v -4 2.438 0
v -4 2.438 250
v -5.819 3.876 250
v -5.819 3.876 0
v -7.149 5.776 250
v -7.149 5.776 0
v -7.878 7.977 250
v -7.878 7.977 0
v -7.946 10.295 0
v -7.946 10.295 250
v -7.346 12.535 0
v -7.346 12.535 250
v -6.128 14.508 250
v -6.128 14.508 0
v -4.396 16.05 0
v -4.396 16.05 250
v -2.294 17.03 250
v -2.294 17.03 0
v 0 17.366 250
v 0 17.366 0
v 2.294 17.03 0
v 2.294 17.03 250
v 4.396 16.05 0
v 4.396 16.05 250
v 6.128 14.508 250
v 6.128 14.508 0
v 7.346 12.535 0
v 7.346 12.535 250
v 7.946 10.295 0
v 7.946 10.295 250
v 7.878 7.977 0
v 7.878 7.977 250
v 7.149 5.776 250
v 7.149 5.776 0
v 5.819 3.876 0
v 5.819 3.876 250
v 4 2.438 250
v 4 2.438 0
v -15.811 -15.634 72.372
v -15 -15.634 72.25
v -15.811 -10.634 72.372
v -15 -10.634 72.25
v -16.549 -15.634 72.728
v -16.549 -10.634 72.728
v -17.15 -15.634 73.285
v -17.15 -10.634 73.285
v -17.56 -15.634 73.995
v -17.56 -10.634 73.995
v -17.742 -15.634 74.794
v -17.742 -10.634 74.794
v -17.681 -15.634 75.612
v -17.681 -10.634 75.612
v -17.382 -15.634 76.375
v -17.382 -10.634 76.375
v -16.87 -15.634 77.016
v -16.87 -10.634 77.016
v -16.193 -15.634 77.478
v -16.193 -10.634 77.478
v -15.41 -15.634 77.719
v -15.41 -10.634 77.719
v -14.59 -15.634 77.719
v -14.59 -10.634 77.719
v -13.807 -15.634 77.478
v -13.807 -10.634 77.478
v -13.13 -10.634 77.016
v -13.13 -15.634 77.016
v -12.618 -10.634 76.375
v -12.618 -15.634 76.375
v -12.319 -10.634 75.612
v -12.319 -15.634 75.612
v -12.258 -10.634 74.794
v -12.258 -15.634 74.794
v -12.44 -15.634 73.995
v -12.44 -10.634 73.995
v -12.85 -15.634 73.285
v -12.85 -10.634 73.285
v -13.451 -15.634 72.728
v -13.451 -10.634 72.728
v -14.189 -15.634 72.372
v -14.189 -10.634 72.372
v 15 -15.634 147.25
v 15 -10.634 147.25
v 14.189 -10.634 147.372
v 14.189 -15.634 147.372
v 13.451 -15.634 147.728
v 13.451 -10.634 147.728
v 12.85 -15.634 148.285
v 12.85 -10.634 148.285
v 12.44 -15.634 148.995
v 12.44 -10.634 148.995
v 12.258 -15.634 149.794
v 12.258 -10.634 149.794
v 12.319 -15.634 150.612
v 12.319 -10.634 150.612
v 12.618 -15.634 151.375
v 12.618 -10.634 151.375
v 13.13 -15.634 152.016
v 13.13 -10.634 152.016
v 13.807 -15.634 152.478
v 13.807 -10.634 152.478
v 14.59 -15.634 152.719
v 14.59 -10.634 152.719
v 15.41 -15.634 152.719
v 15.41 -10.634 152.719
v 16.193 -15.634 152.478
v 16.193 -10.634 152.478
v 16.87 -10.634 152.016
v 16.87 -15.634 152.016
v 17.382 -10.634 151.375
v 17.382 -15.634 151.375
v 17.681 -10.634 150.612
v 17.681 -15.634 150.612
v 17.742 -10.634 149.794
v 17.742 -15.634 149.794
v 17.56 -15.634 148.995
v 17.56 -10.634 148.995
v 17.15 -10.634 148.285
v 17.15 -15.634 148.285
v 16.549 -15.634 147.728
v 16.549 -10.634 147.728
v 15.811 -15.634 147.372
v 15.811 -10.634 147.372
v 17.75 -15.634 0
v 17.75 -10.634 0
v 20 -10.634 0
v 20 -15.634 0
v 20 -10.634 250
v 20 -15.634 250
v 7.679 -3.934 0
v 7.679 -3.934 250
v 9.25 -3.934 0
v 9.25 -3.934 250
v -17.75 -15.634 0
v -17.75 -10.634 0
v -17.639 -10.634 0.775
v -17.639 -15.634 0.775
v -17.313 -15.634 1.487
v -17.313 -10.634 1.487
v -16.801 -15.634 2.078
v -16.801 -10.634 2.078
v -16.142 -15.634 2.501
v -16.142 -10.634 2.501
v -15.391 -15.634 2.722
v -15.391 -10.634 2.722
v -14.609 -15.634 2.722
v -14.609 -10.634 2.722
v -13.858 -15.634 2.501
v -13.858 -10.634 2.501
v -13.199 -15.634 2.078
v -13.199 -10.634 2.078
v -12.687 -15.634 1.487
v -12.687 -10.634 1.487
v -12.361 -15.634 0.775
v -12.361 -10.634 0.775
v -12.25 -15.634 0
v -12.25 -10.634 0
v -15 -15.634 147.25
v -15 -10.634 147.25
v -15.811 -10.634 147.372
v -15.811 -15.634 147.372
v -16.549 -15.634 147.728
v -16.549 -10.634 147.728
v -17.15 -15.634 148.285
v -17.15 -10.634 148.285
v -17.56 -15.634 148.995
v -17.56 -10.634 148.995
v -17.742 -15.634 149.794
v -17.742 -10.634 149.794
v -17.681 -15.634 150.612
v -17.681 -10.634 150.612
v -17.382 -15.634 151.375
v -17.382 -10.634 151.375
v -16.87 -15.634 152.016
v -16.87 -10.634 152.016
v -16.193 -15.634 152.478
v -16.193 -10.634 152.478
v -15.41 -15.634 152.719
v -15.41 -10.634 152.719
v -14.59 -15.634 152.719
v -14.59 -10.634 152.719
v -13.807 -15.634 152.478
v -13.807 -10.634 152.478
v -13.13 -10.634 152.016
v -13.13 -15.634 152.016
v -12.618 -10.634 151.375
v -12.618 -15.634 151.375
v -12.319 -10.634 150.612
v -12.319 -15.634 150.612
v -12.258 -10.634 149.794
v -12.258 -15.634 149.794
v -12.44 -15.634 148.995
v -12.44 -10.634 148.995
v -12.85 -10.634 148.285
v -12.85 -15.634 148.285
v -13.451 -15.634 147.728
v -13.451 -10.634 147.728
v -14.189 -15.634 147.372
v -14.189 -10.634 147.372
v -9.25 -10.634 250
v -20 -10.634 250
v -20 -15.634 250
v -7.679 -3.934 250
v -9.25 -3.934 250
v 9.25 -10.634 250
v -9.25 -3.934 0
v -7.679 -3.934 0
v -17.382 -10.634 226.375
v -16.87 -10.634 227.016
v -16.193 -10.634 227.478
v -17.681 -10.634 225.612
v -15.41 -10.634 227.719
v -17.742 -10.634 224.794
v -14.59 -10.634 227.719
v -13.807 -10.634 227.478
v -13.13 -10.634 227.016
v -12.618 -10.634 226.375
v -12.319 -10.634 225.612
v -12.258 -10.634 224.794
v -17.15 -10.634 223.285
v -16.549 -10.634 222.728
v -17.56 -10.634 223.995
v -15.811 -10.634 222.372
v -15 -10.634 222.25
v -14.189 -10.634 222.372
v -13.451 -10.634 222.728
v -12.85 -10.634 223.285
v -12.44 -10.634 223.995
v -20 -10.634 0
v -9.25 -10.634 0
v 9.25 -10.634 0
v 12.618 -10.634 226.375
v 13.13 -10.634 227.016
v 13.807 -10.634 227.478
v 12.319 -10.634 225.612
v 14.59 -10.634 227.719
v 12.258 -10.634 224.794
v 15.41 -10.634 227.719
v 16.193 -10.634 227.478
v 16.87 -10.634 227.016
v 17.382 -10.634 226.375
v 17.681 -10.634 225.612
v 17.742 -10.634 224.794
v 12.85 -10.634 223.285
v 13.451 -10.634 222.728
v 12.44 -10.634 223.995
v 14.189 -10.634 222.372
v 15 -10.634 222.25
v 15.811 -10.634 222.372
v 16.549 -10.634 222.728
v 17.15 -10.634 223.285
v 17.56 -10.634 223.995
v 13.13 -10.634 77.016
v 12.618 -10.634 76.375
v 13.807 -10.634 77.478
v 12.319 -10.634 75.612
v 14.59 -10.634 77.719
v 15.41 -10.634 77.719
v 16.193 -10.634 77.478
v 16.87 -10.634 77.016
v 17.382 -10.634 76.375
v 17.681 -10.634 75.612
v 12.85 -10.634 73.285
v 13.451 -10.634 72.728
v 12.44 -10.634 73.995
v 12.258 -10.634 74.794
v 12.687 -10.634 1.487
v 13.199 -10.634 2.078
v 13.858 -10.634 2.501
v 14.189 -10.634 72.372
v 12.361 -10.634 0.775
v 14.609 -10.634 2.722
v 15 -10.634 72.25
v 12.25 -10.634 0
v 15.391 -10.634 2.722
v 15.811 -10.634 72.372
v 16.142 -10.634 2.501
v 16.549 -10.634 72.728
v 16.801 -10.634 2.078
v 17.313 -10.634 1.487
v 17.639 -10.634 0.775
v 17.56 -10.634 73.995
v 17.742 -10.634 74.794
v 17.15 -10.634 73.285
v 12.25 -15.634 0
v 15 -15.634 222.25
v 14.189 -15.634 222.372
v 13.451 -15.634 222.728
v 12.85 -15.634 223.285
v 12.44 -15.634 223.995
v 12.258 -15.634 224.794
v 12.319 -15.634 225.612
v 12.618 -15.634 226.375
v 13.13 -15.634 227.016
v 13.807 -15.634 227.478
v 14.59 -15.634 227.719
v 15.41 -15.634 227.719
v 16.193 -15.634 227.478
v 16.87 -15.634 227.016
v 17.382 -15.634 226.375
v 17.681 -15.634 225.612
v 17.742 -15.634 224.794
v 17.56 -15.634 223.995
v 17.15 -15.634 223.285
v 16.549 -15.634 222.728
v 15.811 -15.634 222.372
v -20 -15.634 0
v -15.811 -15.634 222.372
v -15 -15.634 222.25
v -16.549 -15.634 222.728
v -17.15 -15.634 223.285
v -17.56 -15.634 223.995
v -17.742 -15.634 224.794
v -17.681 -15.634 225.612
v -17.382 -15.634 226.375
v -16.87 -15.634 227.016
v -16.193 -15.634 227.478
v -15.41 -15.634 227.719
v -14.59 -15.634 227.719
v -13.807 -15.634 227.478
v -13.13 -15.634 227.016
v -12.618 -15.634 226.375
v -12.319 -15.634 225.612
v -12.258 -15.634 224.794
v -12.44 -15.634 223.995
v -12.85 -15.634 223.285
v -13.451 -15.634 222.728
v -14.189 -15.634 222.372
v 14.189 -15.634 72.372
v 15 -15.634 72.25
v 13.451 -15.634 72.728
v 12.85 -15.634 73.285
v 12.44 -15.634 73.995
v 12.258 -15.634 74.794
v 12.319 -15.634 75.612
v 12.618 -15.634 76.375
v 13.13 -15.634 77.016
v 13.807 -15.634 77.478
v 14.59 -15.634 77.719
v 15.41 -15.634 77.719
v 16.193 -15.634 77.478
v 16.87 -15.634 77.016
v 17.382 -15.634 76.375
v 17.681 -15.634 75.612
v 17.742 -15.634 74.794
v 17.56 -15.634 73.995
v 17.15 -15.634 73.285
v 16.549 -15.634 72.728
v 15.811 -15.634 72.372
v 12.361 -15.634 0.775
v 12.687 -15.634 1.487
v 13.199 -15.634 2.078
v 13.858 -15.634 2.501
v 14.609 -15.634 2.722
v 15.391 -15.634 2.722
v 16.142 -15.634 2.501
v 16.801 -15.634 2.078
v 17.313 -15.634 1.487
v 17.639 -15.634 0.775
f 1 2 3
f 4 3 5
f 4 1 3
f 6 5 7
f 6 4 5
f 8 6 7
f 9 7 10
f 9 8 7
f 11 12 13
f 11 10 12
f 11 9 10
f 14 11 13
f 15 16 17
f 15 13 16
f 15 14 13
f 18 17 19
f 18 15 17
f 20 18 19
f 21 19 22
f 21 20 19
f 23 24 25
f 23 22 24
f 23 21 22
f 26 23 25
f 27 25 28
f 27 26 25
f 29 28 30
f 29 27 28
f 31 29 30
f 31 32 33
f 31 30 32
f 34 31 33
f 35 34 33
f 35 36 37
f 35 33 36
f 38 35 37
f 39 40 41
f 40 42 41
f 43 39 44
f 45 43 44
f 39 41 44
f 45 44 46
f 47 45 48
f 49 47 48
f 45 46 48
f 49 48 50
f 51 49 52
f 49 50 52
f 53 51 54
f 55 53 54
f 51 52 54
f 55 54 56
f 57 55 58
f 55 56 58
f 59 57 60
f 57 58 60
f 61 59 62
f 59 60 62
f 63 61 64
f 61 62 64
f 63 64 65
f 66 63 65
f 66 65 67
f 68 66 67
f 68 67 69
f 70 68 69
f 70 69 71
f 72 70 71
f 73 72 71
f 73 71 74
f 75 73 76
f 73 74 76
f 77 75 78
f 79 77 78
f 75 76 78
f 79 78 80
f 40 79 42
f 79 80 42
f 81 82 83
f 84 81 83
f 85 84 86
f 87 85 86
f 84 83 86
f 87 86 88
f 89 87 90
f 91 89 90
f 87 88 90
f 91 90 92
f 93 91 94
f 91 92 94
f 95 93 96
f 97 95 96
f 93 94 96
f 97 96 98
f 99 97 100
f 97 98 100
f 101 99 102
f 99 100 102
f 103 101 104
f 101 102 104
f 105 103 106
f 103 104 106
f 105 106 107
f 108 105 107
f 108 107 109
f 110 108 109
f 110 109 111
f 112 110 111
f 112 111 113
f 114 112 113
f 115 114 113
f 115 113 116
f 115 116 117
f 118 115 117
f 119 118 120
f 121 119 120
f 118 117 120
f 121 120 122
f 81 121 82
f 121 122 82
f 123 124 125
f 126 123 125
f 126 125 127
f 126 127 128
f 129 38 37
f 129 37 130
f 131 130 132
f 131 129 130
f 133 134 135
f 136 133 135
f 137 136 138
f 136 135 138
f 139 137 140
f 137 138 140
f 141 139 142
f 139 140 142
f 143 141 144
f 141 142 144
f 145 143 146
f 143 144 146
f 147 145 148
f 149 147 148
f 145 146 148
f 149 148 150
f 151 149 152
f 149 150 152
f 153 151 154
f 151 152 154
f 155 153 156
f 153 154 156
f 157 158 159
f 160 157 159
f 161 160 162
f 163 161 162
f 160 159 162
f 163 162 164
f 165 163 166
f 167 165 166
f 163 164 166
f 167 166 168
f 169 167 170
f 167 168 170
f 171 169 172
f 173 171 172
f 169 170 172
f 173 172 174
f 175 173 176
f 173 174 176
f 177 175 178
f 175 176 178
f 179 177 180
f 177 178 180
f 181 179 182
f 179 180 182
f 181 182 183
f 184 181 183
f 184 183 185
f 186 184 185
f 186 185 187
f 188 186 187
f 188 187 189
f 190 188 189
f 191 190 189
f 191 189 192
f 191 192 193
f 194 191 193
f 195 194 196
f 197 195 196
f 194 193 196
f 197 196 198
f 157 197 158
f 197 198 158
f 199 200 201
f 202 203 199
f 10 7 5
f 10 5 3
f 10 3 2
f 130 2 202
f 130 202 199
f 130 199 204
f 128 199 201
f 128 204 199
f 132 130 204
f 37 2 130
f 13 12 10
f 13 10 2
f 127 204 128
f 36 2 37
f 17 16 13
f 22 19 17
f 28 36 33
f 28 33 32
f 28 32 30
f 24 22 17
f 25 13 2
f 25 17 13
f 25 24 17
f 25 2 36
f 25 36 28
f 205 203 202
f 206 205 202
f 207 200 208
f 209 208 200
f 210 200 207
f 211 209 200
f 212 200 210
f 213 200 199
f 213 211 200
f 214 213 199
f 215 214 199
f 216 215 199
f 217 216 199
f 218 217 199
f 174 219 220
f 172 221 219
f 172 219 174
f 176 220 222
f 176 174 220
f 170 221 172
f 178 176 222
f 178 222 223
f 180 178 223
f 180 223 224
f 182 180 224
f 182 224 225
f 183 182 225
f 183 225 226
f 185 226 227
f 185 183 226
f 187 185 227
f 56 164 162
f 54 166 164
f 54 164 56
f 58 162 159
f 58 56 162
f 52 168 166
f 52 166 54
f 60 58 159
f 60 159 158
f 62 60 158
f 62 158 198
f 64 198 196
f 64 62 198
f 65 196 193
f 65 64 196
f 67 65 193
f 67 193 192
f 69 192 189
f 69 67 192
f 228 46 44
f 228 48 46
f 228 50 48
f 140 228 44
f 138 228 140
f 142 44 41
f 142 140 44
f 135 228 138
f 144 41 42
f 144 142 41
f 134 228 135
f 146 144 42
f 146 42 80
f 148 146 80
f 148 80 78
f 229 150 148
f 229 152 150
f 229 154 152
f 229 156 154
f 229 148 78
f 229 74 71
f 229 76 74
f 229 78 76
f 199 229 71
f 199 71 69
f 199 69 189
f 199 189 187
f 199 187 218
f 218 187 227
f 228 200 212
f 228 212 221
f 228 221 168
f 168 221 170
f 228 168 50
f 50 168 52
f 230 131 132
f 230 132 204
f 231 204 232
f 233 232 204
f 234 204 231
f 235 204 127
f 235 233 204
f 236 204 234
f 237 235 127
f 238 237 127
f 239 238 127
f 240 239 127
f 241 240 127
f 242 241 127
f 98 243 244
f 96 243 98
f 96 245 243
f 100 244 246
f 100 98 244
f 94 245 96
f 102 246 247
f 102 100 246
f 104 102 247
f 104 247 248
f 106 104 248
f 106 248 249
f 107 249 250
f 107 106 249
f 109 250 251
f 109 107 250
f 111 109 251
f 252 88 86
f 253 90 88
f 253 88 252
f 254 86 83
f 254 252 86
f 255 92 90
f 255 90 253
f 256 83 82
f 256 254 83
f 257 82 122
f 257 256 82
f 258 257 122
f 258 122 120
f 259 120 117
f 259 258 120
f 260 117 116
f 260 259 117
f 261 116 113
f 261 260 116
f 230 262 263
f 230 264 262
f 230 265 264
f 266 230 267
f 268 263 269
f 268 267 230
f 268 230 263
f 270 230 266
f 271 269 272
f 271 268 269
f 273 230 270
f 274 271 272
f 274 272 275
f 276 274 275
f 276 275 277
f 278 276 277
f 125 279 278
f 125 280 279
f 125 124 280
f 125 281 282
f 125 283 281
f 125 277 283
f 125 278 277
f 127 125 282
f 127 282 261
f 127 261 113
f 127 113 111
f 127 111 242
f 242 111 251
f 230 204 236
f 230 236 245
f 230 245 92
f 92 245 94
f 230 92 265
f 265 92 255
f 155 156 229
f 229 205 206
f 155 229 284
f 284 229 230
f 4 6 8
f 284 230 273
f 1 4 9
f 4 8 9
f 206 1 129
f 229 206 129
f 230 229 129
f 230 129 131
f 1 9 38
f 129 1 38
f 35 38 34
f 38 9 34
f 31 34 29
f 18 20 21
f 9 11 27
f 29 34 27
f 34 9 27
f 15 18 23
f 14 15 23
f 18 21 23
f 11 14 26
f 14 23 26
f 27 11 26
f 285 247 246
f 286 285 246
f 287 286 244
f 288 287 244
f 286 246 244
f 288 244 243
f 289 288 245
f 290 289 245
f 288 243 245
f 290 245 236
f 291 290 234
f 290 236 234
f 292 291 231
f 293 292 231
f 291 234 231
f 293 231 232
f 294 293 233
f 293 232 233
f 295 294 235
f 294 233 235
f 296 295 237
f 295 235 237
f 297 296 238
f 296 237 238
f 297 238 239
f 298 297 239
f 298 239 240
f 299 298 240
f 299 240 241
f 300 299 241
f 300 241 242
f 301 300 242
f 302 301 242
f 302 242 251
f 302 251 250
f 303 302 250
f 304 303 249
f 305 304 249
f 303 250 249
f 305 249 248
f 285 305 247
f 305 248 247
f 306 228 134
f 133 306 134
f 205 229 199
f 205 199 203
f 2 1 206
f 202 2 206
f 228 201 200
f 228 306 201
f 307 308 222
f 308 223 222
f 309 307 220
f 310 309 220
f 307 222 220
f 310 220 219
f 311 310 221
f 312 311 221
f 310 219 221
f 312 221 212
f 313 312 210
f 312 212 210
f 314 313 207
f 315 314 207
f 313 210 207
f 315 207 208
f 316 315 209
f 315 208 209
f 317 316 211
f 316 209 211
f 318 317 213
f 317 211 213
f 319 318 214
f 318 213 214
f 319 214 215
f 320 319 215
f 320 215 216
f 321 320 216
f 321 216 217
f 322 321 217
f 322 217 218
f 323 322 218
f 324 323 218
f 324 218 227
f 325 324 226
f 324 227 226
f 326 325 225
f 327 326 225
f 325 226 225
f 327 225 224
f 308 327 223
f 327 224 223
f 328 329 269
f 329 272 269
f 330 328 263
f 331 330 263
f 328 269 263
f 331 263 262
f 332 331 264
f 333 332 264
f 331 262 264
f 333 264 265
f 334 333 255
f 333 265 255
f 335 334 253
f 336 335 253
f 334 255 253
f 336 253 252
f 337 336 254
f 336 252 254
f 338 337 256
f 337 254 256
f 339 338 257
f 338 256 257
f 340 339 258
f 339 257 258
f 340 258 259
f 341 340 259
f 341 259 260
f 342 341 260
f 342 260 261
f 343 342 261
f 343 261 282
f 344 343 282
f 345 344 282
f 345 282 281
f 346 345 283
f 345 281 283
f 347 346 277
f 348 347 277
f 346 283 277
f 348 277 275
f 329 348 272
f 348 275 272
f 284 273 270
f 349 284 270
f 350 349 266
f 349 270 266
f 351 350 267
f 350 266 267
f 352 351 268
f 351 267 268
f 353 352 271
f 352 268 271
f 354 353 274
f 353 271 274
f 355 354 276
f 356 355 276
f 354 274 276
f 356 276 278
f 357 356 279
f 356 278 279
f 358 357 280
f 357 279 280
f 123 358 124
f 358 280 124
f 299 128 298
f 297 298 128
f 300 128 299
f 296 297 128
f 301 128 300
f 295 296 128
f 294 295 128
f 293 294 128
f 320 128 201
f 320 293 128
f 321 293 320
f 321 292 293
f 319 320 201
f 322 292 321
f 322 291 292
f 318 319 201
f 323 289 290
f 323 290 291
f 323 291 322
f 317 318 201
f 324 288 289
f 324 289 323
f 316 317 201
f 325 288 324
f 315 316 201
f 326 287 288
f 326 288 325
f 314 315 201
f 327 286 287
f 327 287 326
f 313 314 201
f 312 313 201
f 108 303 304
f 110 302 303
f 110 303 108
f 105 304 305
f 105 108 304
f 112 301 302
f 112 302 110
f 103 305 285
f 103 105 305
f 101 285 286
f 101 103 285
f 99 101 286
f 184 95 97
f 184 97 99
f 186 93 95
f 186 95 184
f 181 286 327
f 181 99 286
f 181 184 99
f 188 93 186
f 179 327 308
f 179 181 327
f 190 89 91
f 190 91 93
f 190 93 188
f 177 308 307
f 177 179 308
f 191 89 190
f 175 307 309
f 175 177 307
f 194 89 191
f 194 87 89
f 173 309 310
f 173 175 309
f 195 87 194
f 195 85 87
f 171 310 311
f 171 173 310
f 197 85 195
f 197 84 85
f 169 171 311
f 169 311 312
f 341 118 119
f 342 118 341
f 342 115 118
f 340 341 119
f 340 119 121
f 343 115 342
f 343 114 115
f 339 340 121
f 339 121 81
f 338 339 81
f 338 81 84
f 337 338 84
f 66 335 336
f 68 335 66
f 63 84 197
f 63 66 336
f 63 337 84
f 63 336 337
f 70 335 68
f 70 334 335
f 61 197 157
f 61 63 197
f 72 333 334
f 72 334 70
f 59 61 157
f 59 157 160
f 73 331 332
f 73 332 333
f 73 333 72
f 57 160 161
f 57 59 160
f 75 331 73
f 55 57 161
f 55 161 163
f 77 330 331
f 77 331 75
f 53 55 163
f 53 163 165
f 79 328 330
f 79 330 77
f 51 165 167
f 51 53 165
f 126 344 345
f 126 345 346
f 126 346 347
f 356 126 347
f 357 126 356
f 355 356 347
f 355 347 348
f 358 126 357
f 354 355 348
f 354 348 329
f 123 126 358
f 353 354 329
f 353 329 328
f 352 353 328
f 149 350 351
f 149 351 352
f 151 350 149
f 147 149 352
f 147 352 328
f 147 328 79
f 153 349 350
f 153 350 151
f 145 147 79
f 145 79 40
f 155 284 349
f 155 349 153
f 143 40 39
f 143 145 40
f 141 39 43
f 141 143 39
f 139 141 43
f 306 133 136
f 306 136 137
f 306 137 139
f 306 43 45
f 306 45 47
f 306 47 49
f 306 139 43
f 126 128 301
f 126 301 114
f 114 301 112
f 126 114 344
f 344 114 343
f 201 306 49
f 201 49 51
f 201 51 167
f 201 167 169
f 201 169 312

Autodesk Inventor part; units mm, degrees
ref_plane "YZ Plane" through (0, 0, 0) normal (1, 0, 0) x (0, 1, 0)
ref_plane "XZ Plane" through (0, 0, 0) normal (0, 1, 0) x (-1, 0, 0)
ref_plane "XY Plane" through (0, 0, 0) normal (0, 0, 1) x (1, 0, 0)
sketch "Esboço1" plane through (0, 0, 0) normal (0, 0, 1) x (1, 0, 0)
  arc A0 (4, 2.4377) -> (-4, 2.4377) centre (0, 9.3659) ccw
  line L0 (9.25, -3.9341) -> (9.25, -10.6341)
  line L1 (-9.25, -10.6341) -> (-9.25, -3.9341)
  line L2 (4, -15.6341) -> (-4, -15.6341)
  line L3 (20, -15.6341) -> (-20, -15.6341)
  line L4 (-20, -15.6341) -> (-20, -10.6341)
  line L5 (20, -10.6341) -> (20, -15.6341)
  line L6 (7.6788, -3.9341) -> (9.25, -3.9341)
  line L7 (-9.25, -3.9341) -> (-7.6788, -3.9341)
  line L8 (9.25, -10.6341) -> (20, -10.6341)
  line L9 (-20, -10.6341) -> (-9.25, -10.6341)
  line L10 (-4, 2.4377) -> (-7.6788, -3.9341)
  line L11 (-17.4151, -20.798) -> (-22.4188, -29.4646)
  line L12 (17.4151, -20.798) -> (23.6527, -31.6017)
  line L13 (9.25, -15.6341) -> (4, -15.6341)
  line L14 (0, -15.6341) -> (-9.25, -15.6341)
  line L15 (4, 2.4377) -> (7.6788, -3.9341)
  dimension "d6" = 16
  dimension "d7" = 25
  dimension "d8" = 18.5
  dimension "d9" = 11.7
  dimension "d10" = 8
  dimension "d13" = 5
  dimension "d14" = 40
extrude "Extrusão1" add sketch "Esboço1" along normal blind 250
sketch "Esboço3" plane through (-20, -15.6341, 0) normal (0, -1, 0) x (1, 0, 0)
  line L0 (0, 250) -> (40, 250) construction
  line L1 (20, 250) -> (20, 0) construction
  line L2 (20, 225) -> (5, 225) construction
  line L3 (5, 225) -> (20, 225) construction
  line L4 (20, 225) -> (35, 225) construction
  circle A0 centre (5, 225) radius 2.75
  circle A1 centre (35, 225) radius 2.75
  line L5 (40, 0) -> (0, 0) construction
  line L6 (35, 250) -> (35, 0) construction
  line L7 (5, 250) -> (5, 0) construction
  circle A2 centre (35, 150) radius 2.75
  circle A3 centre (35, 75) radius 2.75
  circle A4 centre (35, 0) radius 2.75
  circle A5 centre (5, 150) radius 2.75
  circle A6 centre (5, 75) radius 2.75
  circle A7 centre (5, 0) radius 2.75
  dimension "d18" = 15
  dimension "d19" = 15
  dimension "d20" = 5.5
  dimension "d21" = 5.5
  dimension "d22" = 25
  dimension "d37" = 75
  dimension "d44" = 75
hole "Furo2" at (15, -15.6341, 225) at (-15, -15.6341, 225) at (-15, -15.6341, 150) at (15, -15.6341, 150) at (-15, -15.6341, 75) at (15, -15.6341, 75) at (15, -15.6341, 0) at (-15, -15.6341, 0) direction (0, 1, 0) diameter 5.5 end through all
properties part number "SBR16_200MM"
